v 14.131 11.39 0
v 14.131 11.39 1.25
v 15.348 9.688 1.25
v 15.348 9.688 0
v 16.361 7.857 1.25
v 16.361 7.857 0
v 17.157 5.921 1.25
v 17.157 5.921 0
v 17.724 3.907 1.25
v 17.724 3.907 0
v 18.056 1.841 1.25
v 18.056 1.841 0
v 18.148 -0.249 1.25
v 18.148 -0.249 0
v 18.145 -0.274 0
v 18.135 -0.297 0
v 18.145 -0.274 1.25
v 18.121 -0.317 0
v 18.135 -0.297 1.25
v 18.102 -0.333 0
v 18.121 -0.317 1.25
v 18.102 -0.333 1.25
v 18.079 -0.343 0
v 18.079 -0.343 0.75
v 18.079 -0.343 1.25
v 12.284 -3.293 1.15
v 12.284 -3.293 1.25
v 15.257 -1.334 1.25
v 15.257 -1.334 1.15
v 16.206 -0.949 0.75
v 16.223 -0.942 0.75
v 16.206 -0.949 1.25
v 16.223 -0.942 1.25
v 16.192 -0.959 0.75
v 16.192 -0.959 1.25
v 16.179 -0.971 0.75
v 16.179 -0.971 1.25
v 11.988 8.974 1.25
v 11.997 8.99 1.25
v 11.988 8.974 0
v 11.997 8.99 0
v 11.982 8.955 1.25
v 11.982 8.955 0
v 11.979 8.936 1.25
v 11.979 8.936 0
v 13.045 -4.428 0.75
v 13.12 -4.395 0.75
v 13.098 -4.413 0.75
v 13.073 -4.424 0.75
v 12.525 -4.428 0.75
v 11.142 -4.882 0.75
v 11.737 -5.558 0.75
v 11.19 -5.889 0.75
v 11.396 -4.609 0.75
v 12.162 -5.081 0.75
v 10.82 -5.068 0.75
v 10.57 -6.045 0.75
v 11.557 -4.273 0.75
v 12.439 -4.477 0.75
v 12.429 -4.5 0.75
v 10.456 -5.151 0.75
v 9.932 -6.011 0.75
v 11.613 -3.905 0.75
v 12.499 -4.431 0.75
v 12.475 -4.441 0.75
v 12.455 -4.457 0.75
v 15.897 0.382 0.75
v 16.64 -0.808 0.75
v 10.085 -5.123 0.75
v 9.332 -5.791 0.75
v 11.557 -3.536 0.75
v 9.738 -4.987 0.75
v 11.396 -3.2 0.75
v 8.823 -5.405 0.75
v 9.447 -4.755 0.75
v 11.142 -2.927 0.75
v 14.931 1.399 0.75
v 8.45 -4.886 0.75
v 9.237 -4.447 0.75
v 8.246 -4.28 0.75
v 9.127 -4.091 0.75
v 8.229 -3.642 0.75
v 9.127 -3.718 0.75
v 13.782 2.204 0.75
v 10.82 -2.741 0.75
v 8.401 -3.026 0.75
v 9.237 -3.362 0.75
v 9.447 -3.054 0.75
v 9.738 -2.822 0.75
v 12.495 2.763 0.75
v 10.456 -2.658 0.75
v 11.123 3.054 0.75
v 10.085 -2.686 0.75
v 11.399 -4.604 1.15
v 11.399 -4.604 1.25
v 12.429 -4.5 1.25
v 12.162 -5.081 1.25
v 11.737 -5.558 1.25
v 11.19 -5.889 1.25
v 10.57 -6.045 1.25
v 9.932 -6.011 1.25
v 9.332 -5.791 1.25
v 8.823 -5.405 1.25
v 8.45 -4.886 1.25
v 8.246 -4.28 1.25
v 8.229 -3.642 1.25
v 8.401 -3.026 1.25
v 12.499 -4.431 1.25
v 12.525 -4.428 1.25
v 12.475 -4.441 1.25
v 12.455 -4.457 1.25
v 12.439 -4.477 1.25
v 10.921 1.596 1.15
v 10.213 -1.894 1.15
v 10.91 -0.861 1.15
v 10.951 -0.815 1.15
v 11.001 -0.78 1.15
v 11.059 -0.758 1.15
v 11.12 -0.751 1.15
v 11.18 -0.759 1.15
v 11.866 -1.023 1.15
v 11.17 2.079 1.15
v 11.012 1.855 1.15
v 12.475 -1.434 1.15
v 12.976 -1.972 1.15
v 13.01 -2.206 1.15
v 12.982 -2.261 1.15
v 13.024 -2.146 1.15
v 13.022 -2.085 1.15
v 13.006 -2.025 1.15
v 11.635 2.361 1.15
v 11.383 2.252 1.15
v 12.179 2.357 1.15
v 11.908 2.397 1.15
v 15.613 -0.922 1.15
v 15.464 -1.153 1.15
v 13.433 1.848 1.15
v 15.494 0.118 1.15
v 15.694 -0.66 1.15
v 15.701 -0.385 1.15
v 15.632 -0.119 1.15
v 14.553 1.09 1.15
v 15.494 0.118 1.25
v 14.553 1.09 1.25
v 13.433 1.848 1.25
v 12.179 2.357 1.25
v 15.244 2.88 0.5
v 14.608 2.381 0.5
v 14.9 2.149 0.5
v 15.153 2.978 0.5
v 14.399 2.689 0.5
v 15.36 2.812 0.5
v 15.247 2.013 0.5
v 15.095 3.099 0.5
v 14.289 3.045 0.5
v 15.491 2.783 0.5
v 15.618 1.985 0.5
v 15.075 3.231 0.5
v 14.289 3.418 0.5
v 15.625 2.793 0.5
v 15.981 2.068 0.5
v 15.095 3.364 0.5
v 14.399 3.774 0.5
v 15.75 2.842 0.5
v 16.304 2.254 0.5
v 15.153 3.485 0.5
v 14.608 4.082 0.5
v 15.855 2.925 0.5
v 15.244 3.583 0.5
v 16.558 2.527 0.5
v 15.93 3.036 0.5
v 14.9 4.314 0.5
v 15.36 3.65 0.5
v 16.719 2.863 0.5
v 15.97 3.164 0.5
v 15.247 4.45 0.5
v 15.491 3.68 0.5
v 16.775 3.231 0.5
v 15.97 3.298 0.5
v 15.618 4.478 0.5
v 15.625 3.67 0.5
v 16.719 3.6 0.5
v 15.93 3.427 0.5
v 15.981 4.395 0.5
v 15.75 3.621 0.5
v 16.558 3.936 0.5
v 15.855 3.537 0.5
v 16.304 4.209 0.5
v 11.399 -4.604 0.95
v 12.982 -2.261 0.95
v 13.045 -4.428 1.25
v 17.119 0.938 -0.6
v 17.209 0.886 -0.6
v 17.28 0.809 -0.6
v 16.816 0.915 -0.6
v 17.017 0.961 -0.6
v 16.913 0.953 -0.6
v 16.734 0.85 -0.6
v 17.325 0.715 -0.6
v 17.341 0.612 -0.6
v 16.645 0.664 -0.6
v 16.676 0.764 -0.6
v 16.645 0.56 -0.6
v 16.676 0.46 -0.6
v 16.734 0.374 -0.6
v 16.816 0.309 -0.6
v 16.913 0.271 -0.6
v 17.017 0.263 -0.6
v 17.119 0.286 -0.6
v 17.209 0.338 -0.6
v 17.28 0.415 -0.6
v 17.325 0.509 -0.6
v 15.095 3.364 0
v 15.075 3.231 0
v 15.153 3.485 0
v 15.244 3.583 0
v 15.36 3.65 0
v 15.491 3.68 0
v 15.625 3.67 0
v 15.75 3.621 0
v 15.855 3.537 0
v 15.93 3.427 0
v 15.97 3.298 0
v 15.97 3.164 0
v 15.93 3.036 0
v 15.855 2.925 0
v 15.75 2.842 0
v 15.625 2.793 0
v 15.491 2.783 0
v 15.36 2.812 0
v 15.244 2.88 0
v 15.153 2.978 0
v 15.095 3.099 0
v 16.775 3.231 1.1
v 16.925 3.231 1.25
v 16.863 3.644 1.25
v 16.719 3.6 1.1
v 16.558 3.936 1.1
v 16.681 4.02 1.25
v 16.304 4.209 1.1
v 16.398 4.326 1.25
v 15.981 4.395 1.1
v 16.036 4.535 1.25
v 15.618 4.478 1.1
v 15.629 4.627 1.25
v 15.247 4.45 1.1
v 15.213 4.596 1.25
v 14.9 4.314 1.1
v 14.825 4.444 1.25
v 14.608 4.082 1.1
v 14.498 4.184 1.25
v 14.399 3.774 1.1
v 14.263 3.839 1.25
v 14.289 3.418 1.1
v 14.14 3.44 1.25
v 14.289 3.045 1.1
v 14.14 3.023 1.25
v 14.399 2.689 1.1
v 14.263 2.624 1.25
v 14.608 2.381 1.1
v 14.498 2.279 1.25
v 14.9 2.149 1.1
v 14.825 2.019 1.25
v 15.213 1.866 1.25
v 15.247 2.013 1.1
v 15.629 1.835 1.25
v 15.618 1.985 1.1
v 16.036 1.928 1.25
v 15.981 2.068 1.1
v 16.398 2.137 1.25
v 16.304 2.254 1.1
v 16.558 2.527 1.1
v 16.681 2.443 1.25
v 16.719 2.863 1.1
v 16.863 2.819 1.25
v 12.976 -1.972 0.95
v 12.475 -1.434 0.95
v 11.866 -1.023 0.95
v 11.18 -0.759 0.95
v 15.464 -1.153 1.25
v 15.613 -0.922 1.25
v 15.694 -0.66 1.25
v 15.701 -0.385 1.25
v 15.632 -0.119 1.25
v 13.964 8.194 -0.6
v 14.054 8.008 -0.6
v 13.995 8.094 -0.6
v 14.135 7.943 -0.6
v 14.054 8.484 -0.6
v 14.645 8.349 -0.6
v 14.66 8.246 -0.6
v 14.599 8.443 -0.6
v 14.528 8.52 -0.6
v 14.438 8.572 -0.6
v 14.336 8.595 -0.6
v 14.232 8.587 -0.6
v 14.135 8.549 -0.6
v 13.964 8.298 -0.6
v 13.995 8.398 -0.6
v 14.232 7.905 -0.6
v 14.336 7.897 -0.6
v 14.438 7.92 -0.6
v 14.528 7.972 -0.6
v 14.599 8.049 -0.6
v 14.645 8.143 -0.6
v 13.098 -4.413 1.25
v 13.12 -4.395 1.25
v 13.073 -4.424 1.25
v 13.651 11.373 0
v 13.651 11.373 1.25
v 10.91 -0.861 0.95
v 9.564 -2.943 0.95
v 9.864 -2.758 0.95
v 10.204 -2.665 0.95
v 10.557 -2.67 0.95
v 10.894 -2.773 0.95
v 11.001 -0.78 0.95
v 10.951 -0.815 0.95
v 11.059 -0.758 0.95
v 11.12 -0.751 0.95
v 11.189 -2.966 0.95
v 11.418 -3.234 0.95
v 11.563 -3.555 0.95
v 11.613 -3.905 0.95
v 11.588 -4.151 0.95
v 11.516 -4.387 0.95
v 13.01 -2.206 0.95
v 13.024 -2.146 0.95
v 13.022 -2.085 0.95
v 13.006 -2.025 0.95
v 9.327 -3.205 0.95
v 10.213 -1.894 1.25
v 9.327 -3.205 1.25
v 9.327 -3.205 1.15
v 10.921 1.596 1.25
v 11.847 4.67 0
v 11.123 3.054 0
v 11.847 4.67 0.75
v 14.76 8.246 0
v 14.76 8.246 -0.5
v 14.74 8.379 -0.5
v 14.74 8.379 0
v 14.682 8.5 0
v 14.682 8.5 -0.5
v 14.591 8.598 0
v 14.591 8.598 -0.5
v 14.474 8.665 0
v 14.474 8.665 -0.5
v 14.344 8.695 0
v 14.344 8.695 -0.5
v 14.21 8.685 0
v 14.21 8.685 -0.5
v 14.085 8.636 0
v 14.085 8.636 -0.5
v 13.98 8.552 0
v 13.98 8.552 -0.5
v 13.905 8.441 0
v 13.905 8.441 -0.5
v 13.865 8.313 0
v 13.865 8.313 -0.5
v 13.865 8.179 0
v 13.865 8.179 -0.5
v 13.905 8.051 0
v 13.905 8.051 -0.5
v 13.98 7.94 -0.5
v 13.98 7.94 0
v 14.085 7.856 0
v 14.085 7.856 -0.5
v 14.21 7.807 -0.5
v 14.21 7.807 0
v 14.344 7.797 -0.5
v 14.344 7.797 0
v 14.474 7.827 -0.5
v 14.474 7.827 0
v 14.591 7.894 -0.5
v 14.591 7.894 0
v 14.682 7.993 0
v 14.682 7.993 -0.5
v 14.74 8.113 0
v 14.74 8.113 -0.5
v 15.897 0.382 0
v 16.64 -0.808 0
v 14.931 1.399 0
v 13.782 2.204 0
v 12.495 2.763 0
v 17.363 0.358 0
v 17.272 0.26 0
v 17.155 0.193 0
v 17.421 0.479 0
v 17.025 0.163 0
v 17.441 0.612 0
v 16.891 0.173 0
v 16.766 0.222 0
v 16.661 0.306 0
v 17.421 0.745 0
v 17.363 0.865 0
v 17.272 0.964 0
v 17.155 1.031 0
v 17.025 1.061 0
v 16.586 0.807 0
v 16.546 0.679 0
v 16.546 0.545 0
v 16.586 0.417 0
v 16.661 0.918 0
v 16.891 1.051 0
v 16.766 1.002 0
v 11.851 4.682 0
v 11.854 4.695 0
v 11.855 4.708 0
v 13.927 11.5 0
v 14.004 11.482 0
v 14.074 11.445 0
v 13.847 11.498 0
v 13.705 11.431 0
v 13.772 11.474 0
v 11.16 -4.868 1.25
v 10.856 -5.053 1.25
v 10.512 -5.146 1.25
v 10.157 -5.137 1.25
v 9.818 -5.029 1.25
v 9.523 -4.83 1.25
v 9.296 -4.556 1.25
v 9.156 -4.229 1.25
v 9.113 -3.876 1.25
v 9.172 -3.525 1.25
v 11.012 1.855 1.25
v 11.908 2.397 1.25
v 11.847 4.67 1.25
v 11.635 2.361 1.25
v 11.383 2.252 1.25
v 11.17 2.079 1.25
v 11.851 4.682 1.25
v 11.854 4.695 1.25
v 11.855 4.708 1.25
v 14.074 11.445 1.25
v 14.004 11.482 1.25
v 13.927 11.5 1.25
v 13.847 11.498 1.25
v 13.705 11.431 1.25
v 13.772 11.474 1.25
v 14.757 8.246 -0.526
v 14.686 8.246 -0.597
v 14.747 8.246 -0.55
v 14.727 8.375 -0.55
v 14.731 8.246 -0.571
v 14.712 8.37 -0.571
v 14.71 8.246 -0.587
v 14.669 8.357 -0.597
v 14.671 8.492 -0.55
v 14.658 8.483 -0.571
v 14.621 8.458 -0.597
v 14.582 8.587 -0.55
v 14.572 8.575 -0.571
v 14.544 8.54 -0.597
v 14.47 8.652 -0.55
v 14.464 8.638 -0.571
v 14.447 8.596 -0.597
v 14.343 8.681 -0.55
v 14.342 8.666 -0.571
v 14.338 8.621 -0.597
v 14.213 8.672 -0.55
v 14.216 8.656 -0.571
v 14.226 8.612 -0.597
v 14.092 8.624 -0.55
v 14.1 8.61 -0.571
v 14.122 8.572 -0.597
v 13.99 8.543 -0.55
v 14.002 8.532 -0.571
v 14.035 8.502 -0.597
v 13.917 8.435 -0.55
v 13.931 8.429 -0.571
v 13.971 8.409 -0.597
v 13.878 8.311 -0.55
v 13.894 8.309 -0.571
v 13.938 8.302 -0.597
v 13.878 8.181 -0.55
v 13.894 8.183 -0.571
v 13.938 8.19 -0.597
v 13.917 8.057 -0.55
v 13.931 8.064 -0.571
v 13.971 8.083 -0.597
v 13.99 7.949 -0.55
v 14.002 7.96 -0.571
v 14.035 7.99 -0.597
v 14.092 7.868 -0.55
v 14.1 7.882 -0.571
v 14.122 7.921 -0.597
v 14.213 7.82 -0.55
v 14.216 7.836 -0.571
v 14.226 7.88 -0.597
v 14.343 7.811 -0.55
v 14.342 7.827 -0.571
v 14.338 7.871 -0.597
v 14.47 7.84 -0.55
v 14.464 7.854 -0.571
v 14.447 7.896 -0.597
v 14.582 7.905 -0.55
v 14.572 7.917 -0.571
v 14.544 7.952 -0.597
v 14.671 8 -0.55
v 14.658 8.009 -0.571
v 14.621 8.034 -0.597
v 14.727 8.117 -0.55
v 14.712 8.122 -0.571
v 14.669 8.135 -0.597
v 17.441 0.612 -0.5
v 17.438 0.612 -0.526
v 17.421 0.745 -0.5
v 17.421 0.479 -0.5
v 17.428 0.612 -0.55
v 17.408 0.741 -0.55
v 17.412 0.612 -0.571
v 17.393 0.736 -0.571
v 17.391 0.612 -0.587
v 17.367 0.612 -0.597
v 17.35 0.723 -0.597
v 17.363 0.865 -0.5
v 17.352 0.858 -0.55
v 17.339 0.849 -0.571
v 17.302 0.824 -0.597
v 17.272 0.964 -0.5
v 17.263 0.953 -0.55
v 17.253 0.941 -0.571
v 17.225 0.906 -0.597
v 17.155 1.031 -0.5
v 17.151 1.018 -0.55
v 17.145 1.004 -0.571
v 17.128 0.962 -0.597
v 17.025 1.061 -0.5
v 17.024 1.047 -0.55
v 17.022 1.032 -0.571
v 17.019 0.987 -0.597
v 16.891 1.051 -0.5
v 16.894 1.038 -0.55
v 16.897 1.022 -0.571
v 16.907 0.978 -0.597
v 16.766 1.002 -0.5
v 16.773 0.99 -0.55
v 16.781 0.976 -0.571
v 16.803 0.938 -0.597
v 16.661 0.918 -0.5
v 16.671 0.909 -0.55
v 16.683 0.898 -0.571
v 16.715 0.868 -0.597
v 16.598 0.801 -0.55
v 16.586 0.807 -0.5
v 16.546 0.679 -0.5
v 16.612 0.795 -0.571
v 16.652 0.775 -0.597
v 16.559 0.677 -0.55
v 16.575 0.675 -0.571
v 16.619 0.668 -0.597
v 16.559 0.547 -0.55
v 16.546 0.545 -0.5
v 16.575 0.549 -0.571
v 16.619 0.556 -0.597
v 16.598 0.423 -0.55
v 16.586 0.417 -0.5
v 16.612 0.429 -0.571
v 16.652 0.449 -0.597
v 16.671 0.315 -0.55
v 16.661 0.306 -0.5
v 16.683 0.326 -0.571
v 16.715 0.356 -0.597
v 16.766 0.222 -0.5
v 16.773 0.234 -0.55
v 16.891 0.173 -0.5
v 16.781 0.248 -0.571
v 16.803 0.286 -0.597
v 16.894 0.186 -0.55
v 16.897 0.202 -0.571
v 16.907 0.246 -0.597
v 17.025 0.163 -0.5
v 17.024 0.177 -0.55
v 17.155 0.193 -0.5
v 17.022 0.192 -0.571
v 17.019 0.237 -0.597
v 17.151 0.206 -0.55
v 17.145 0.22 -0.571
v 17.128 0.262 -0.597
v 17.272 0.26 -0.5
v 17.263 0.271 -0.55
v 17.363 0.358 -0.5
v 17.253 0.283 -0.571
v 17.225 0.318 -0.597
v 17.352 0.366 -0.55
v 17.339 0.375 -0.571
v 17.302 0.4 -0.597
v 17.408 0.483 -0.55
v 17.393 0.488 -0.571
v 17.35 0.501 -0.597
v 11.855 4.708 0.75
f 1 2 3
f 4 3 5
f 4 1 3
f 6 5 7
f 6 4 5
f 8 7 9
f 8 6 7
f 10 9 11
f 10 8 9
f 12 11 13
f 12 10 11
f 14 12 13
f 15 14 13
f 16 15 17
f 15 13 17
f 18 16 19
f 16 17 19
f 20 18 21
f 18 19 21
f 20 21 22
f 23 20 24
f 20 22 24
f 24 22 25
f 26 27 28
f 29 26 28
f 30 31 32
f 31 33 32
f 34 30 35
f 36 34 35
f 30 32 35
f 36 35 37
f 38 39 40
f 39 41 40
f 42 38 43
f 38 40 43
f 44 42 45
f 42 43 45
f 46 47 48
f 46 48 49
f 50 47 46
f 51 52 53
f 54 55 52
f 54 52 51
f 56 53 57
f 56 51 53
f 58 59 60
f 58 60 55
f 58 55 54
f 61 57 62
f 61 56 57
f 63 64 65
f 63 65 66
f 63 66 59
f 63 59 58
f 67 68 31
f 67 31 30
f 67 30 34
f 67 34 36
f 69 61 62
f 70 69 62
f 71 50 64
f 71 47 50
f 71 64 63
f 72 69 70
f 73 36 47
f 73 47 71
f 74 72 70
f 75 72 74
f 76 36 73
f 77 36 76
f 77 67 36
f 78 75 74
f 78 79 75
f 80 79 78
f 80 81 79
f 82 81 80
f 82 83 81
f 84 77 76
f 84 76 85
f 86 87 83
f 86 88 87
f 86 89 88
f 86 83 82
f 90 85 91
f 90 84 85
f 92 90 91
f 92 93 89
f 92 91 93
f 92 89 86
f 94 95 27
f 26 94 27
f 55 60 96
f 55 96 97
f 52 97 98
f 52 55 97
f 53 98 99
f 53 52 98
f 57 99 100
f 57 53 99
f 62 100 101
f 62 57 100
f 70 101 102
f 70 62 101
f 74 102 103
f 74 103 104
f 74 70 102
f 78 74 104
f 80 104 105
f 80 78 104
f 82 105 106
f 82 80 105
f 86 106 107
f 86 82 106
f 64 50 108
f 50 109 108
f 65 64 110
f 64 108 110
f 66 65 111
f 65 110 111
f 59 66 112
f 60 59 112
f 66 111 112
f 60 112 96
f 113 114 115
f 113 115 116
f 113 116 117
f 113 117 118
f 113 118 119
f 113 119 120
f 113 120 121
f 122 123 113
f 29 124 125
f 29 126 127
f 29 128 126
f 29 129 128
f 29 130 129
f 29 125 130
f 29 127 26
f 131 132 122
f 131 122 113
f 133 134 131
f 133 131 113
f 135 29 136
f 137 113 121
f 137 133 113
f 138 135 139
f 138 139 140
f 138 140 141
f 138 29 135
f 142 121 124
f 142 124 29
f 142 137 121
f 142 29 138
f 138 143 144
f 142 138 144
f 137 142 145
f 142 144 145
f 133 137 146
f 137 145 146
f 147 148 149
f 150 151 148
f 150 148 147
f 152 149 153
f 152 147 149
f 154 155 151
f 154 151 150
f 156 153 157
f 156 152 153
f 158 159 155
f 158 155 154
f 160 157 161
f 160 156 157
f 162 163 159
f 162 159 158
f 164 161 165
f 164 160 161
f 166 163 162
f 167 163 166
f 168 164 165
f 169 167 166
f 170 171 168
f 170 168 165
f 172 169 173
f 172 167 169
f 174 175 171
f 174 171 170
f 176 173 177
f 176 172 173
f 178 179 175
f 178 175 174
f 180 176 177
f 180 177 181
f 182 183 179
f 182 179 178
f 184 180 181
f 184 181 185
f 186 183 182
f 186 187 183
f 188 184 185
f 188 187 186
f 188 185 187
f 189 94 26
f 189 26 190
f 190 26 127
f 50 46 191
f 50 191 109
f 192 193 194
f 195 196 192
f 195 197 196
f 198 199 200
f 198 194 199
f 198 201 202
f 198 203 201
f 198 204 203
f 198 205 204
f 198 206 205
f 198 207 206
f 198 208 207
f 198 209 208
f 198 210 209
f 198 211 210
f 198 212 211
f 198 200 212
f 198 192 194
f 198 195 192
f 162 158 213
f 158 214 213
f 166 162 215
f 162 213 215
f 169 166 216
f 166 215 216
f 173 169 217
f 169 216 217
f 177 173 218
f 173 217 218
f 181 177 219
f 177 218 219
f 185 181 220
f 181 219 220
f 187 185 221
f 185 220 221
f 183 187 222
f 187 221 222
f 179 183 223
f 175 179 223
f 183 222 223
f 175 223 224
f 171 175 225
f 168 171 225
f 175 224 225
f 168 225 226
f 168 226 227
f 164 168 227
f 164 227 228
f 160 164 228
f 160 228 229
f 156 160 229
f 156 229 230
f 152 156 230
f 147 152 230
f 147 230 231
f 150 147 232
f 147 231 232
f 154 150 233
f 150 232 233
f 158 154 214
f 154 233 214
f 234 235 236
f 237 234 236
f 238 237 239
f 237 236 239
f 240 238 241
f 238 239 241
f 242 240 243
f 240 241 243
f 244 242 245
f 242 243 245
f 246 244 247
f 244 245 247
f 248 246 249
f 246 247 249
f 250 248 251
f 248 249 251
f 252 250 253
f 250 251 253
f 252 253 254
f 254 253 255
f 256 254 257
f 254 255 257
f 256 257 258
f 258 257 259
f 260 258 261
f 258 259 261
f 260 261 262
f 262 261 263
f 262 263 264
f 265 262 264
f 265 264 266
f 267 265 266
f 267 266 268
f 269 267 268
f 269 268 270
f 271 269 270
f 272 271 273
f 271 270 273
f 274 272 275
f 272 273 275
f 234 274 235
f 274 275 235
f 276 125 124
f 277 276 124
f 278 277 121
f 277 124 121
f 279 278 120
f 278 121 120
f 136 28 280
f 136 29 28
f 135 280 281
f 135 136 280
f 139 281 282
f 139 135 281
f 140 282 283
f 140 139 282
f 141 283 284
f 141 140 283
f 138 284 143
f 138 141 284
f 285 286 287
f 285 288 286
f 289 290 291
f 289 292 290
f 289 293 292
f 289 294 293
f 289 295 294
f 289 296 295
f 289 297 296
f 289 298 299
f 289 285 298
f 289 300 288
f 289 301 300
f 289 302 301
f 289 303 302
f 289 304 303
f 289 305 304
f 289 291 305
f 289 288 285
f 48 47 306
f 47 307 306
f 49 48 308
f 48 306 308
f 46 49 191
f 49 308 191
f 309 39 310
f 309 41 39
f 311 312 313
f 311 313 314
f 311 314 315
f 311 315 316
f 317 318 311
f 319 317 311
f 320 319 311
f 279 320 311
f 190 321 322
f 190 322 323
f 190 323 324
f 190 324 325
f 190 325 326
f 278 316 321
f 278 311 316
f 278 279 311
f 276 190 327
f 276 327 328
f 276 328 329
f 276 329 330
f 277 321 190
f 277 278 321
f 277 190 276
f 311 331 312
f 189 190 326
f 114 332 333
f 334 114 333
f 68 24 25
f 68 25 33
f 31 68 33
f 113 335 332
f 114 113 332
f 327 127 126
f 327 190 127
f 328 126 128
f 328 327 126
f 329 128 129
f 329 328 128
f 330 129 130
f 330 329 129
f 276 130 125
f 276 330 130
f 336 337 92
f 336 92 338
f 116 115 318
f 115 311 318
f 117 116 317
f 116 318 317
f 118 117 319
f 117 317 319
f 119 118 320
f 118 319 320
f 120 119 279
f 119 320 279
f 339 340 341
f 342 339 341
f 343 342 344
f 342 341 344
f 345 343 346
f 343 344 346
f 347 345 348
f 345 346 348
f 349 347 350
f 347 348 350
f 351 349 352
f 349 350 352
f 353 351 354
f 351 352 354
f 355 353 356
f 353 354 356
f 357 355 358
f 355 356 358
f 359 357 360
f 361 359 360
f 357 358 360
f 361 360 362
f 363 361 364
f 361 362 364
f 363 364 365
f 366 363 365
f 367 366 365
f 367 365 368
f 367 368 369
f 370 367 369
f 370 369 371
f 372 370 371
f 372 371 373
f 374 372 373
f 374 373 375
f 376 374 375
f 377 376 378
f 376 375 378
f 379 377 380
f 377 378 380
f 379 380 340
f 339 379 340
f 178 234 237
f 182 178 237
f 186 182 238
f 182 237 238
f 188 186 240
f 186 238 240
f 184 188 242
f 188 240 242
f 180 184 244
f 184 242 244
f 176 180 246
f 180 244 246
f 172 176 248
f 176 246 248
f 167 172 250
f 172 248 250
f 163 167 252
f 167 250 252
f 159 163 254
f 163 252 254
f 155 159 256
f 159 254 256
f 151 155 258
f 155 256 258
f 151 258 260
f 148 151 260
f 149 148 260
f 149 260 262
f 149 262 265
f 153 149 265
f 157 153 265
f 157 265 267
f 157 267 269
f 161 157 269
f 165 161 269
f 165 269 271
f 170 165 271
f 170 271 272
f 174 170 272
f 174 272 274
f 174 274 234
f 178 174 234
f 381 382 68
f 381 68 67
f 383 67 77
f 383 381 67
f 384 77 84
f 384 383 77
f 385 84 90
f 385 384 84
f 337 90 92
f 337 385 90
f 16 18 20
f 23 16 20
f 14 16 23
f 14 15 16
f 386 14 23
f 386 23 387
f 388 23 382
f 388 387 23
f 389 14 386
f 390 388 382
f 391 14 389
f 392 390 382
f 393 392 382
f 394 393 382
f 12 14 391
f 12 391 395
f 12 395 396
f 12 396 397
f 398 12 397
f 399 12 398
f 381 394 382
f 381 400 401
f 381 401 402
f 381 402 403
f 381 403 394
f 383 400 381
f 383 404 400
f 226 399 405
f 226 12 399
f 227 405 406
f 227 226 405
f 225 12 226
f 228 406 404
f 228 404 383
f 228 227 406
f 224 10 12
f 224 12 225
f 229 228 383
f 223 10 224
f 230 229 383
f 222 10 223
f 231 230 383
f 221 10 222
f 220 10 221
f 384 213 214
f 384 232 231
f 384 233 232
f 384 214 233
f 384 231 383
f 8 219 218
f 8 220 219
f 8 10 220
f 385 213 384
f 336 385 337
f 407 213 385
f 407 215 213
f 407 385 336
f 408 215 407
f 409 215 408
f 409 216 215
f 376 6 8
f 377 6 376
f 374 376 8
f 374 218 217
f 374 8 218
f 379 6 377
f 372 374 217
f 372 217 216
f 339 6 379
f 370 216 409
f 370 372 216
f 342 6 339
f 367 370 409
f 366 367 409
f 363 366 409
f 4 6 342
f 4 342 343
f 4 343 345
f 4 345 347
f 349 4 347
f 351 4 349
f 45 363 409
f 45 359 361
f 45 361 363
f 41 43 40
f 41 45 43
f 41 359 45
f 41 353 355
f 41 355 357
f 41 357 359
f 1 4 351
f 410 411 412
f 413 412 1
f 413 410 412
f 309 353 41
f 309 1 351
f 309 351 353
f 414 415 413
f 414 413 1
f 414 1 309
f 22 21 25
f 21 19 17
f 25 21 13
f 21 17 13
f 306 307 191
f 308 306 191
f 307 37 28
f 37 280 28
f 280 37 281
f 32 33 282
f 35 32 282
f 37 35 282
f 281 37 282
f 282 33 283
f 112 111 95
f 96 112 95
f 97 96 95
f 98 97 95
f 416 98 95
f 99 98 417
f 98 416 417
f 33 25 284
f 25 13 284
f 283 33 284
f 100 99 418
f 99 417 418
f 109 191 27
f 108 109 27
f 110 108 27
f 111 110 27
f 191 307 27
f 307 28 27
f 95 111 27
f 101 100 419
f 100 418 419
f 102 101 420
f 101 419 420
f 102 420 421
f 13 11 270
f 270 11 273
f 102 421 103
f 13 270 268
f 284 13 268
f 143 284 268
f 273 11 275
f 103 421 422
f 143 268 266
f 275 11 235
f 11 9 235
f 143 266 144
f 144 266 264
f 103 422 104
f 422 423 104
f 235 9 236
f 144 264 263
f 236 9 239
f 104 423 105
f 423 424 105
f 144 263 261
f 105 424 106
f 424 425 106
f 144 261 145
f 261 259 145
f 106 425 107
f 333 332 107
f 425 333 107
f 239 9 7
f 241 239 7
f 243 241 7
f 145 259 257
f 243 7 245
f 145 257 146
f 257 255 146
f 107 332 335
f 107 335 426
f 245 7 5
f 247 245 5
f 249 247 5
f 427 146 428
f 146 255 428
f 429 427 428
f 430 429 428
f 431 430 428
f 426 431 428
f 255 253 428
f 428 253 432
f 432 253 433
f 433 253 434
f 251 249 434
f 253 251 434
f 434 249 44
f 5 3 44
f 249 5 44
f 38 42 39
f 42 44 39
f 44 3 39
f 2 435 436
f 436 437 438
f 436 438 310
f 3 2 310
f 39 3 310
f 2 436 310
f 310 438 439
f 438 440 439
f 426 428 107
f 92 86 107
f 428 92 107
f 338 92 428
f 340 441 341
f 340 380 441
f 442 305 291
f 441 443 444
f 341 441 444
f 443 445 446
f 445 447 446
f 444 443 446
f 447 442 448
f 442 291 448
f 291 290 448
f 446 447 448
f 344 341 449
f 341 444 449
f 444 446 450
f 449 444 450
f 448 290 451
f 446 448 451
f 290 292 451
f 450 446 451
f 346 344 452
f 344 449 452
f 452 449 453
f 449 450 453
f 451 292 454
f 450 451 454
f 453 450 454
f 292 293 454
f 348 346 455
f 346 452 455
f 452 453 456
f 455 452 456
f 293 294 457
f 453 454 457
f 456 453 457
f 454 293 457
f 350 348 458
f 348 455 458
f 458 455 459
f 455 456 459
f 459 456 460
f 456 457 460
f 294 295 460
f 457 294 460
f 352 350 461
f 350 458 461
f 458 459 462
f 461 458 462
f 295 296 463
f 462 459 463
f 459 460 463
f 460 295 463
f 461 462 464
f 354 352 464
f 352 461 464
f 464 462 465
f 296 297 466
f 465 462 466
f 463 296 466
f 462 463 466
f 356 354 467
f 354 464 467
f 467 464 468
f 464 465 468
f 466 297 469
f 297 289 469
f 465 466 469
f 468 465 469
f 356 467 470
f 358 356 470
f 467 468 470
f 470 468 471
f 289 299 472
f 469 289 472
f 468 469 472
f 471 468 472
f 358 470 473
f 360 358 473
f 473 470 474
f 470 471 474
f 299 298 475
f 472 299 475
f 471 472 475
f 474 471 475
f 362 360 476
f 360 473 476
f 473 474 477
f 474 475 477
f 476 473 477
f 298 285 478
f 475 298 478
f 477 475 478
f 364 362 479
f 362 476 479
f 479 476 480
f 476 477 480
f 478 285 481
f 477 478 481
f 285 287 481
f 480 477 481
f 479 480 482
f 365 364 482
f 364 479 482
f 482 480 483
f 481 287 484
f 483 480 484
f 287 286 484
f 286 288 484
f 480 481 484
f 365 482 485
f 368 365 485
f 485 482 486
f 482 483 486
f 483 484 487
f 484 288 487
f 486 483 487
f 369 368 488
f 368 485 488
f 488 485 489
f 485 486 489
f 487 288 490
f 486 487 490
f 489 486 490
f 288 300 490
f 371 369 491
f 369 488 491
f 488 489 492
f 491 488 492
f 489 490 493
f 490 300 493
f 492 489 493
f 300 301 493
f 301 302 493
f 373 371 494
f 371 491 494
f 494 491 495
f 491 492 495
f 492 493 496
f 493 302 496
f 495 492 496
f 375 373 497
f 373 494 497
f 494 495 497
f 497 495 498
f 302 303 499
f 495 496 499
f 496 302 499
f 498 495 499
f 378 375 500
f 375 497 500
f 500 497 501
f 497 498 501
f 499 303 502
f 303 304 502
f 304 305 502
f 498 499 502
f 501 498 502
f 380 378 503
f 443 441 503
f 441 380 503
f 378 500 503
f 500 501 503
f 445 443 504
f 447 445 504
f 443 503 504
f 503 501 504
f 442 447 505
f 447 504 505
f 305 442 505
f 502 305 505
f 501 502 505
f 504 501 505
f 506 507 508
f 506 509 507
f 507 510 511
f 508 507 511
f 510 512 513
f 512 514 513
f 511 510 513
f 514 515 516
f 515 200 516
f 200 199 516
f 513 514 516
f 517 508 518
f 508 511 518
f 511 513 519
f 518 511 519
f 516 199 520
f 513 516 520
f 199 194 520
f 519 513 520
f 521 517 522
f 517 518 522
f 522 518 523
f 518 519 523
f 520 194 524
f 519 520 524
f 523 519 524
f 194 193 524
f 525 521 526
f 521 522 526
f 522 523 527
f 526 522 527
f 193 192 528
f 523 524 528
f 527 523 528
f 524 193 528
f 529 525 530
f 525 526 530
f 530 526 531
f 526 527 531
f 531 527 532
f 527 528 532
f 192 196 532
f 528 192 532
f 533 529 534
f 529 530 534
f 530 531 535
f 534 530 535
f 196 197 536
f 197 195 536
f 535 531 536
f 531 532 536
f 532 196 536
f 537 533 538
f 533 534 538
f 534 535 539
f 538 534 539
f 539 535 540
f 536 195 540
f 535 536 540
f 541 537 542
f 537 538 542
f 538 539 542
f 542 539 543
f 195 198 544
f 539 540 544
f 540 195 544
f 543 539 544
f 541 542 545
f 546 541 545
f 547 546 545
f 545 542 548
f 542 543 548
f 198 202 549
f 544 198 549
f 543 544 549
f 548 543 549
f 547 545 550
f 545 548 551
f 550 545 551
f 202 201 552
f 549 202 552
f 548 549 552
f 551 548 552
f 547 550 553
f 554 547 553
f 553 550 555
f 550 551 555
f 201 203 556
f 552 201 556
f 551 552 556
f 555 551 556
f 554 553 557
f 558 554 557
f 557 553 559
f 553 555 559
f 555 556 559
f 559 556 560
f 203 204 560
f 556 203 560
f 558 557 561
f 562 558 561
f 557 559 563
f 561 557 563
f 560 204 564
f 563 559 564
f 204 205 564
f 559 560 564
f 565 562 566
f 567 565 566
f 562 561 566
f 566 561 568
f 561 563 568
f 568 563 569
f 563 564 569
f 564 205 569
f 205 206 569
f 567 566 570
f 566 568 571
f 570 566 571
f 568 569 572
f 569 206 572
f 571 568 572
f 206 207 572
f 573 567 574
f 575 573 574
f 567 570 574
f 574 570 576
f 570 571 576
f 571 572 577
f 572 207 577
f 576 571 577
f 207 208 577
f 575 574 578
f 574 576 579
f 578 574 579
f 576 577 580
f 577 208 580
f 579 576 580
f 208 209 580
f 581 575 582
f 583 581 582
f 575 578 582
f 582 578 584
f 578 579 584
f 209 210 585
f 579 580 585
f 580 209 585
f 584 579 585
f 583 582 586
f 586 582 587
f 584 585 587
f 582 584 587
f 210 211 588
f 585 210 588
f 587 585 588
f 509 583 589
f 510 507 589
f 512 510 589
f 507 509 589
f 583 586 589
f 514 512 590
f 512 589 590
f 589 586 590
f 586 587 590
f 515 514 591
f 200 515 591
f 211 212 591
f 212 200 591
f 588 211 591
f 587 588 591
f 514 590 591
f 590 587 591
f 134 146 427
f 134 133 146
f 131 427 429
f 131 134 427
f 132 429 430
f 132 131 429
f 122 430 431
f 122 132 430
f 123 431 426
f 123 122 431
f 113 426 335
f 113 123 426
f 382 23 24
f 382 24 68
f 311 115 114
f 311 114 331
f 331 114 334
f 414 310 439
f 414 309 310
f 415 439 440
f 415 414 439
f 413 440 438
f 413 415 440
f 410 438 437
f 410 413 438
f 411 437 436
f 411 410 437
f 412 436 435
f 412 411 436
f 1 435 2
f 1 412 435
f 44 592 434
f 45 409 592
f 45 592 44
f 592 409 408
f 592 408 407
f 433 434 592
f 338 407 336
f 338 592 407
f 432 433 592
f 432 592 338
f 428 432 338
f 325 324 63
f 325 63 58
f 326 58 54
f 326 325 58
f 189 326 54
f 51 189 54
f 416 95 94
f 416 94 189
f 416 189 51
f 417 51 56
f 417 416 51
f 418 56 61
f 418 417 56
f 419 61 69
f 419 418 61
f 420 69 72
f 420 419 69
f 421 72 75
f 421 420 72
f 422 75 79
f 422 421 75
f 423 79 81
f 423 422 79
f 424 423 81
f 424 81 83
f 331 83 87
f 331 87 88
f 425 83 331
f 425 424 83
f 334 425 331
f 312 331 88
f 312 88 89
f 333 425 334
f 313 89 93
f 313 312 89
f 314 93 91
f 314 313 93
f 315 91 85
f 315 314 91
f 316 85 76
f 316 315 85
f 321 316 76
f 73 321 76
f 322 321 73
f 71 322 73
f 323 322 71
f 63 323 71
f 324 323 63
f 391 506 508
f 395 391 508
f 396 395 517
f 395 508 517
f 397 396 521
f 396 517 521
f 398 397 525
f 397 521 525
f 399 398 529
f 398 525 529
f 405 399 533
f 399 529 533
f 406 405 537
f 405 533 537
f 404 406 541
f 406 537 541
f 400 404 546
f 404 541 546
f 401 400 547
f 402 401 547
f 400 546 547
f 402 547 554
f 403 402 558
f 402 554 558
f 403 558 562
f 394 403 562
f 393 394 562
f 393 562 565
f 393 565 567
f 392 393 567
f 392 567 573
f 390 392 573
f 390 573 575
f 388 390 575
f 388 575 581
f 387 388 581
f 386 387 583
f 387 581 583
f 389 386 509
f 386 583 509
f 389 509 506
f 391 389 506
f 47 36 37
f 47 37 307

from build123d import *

# Parameters (mm, degrees)
BOSS_EXTRUDE1_DEPTH = 0.75
BOSS_EXTRUDE2_DEPTH = 0.5
CUT_EXTRUDE1_DEPTH  = 0.1
CUT_EXTRUDE2_DEPTH  = 0.2
SKETCH5_W           = 0.45
SKETCH5_H           = 0.6
SKETCH6_W           = 0.45
SKETCH6_H           = 0.6
SKETCH7_W           = 1.25
SKETCH7_H           = 0.5
HOLE1_D             = 0.9
HOLE1_DEPTH         = 1.85
HOLE1_CBORE_D       = 2.5
HOLE1_CBORE_DEPTH   = 0.75
FILLET1_R           = 0.1
CHAMFER1_SIZE       = 0.15
FILLET2_R           = 0.25
FILLET3_R           = 1


with BuildPart() as part:
    # Sketch1 → Boss-Extrude1 (new body)
    with BuildSketch(Plane(origin=(0, 0, 0), x_dir=(-1, 0, 0), z_dir=(0, 0, -1))):
        with BuildLine():
            Line((-18.147160188, -0.321056231), (-16.640459832, -0.807555039))
            ThreePointArc((-16.640459832, -0.807555039), (-14.376672703, 1.830313994), (-11.123104682, 3.053988922))
            Line((-11.123104682, 3.053988922), (-11.854774008, 4.687962623))
            Line((-11.854774008, 4.687962623), (-11.980143643, 8.966094329))
            Line((-11.980143643, 8.966094329), (-13.651153285, 11.372867219))
            ThreePointArc((-13.651153285, 11.372867219), (-13.886856414, 11.501581597), (-14.131154362, 11.390038472))
            ThreePointArc((-14.131154362, 11.390038472), (-17.168571063, 5.887500969), (-18.147160188, -0.321056231))
        make_face()
    extrude(amount=-BOSS_EXTRUDE1_DEPTH)

    # Sketch2 → Boss-Extrude2 (add)
    with BuildSketch(Plane.XY.offset(0.75)):
        with BuildLine():
            Line((18.147160188, -0.321056231), (16.196912485, -0.950772139))
            Line((16.196912485, -0.950772139), (13.090029226, -4.428012343))
            Line((13.090029226, -4.428012343), (12.448174494, -4.428012343))
            ThreePointArc((12.448174494, -4.428012343), (9.659124877, -5.936170482), (8.400603878, -3.02593619))
            Line((8.400603878, -3.02593619), (11.854774008, 4.687962623))
            Line((11.854774008, 4.687962623), (11.980143643, 8.966094329))
            Line((11.980143643, 8.966094329), (13.651153285, 11.372867219))
            ThreePointArc((13.651153285, 11.372867219), (13.886856414, 11.501581597), (14.131154362, 11.390038472))
            ThreePointArc((14.131154362, 11.390038472), (17.168571063, 5.887500969), (18.147160188, -0.321056231))
        make_face()
    extrude(amount=BOSS_EXTRUDE2_DEPTH)

    # Sketch3 → Cut-Extrude1 (cut)
    with BuildSketch(Plane.XY.offset(1.25)):
        with BuildLine():
            Line((11.118831997, 2.571420588), (10.212805559, -1.893755119))
            Line((10.212805559, -1.893755119), (9.327068413, -3.204862093))
            ThreePointArc((9.327068413, -3.204862093), (11.06260071, -2.868815002), (11.3986478, -4.604347299))
            Line((11.3986478, -4.604347299), (12.284384946, -3.293240325))
            Line((12.284384946, -3.293240325), (16.088661421, -0.786019055))
            ThreePointArc((16.088661421, -0.786019055), (14.012715525, 1.498074346), (11.118831997, 2.571420588))
        make_face()
    extrude(amount=-CUT_EXTRUDE1_DEPTH, mode=Mode.SUBTRACT)

    # Sketch4 → Cut-Extrude2 (cut)
    with BuildSketch(Plane.XY.offset(1.15)):
        with BuildLine():
            Line((11.006450661, -0.718966828), (9.327068413, -3.204862093))
            ThreePointArc((9.327068413, -3.204862093), (11.06260071, -2.868815002), (11.3986478, -4.604347299))
            Line((11.3986478, -4.604347299), (13.078030048, -2.118452035))
            ThreePointArc((13.078030048, -2.118452035), (12.182188875, -1.211551493), (11.006450661, -0.718966828))
        make_face()
    extrude(amount=-CUT_EXTRUDE2_DEPTH, mode=Mode.SUBTRACT)

    # Sketch5 → Revolve1 (revolve)
    with BuildSketch(Plane(origin=(0, 0.611982068, 0), x_dir=(1, 0, 0), z_dir=(0, 1, 0))):
        with Locations((17.216029708, 0.3)):
            Rectangle(SKETCH5_W, SKETCH5_H)
    revolve(axis=Axis((16.991029708, 0.611982068, -0.6), (0, 0, 1)))

    # Sketch6 → Revolve2 (revolve)
    with BuildSketch(Plane(origin=(0, 8.246041644, 0), x_dir=(1, 0, 0), z_dir=(0, 1, 0))):
        with Locations((14.535071469, 0.3)):
            Rectangle(SKETCH6_W, SKETCH6_H)
    revolve(axis=Axis((14.310071469, 8.246041644, -0.6), (0, 0, 1)))

    # Sketch7 → Cut-Revolve1 (revolve, cut)
    with BuildSketch(Plane.XZ.offset(3.904604696)):
        with Locations((10.987858107, 1)):
            Rectangle(SKETCH7_W, SKETCH7_H)
    revolve(axis=Axis((10.362858107, -3.904604696, 1.25), (0, 0, -1)), mode=Mode.SUBTRACT)

    # Hole1
    with Locations(Plane.XY.offset(1.25)):
        with Locations((15.524716589, 3.231351436)):
            CounterBoreHole(HOLE1_D / 2, HOLE1_CBORE_D / 2, HOLE1_CBORE_DEPTH, depth=HOLE1_DEPTH)

    # Fillet1
    fillet1_edges = [part.edges().sort_by_distance(p)[0] for p in [
        (13.860071469, 8.246041644, -0.6),
        (11.854774008, 4.687962623, 0.625),
        (12.448174494, -4.428012343, 1),
        (16.541029708, 0.611982068, -0.6),
        (11.980143643, 8.966094329, 0.625),
        (13.090029226, -4.428012343, 1),
        (18.147160188, -0.321056231, 0.625),
        (16.196912485, -0.950772139, 1),
    ]]
    fillet(fillet1_edges, radius=FILLET1_R)

    # Chamfer1
    chamfer1_edges = [part.edges().sort_by_distance(p)[0] for p in [
        (14.274716589, 3.231351436, 1.25),
    ]]
    chamfer(chamfer1_edges, length=CHAMFER1_SIZE)

    # Fillet2
    fillet2_edges = [part.edges().sort_by_distance(p)[0] for p in [
        (13.078030048, -2.118452035, 1.05),
        (11.006450661, -0.718966828, 1.05),
    ]]
    fillet(fillet2_edges, radius=FILLET2_R)

    # Fillet3
    fillet3_edges = [part.edges().sort_by_distance(p)[0] for p in [
        (11.118831997, 2.571420588, 1.2),
        (16.088661421, -0.786019055, 1.2),
    ]]
    fillet(fillet3_edges, radius=FILLET3_R)


solid = part.part
